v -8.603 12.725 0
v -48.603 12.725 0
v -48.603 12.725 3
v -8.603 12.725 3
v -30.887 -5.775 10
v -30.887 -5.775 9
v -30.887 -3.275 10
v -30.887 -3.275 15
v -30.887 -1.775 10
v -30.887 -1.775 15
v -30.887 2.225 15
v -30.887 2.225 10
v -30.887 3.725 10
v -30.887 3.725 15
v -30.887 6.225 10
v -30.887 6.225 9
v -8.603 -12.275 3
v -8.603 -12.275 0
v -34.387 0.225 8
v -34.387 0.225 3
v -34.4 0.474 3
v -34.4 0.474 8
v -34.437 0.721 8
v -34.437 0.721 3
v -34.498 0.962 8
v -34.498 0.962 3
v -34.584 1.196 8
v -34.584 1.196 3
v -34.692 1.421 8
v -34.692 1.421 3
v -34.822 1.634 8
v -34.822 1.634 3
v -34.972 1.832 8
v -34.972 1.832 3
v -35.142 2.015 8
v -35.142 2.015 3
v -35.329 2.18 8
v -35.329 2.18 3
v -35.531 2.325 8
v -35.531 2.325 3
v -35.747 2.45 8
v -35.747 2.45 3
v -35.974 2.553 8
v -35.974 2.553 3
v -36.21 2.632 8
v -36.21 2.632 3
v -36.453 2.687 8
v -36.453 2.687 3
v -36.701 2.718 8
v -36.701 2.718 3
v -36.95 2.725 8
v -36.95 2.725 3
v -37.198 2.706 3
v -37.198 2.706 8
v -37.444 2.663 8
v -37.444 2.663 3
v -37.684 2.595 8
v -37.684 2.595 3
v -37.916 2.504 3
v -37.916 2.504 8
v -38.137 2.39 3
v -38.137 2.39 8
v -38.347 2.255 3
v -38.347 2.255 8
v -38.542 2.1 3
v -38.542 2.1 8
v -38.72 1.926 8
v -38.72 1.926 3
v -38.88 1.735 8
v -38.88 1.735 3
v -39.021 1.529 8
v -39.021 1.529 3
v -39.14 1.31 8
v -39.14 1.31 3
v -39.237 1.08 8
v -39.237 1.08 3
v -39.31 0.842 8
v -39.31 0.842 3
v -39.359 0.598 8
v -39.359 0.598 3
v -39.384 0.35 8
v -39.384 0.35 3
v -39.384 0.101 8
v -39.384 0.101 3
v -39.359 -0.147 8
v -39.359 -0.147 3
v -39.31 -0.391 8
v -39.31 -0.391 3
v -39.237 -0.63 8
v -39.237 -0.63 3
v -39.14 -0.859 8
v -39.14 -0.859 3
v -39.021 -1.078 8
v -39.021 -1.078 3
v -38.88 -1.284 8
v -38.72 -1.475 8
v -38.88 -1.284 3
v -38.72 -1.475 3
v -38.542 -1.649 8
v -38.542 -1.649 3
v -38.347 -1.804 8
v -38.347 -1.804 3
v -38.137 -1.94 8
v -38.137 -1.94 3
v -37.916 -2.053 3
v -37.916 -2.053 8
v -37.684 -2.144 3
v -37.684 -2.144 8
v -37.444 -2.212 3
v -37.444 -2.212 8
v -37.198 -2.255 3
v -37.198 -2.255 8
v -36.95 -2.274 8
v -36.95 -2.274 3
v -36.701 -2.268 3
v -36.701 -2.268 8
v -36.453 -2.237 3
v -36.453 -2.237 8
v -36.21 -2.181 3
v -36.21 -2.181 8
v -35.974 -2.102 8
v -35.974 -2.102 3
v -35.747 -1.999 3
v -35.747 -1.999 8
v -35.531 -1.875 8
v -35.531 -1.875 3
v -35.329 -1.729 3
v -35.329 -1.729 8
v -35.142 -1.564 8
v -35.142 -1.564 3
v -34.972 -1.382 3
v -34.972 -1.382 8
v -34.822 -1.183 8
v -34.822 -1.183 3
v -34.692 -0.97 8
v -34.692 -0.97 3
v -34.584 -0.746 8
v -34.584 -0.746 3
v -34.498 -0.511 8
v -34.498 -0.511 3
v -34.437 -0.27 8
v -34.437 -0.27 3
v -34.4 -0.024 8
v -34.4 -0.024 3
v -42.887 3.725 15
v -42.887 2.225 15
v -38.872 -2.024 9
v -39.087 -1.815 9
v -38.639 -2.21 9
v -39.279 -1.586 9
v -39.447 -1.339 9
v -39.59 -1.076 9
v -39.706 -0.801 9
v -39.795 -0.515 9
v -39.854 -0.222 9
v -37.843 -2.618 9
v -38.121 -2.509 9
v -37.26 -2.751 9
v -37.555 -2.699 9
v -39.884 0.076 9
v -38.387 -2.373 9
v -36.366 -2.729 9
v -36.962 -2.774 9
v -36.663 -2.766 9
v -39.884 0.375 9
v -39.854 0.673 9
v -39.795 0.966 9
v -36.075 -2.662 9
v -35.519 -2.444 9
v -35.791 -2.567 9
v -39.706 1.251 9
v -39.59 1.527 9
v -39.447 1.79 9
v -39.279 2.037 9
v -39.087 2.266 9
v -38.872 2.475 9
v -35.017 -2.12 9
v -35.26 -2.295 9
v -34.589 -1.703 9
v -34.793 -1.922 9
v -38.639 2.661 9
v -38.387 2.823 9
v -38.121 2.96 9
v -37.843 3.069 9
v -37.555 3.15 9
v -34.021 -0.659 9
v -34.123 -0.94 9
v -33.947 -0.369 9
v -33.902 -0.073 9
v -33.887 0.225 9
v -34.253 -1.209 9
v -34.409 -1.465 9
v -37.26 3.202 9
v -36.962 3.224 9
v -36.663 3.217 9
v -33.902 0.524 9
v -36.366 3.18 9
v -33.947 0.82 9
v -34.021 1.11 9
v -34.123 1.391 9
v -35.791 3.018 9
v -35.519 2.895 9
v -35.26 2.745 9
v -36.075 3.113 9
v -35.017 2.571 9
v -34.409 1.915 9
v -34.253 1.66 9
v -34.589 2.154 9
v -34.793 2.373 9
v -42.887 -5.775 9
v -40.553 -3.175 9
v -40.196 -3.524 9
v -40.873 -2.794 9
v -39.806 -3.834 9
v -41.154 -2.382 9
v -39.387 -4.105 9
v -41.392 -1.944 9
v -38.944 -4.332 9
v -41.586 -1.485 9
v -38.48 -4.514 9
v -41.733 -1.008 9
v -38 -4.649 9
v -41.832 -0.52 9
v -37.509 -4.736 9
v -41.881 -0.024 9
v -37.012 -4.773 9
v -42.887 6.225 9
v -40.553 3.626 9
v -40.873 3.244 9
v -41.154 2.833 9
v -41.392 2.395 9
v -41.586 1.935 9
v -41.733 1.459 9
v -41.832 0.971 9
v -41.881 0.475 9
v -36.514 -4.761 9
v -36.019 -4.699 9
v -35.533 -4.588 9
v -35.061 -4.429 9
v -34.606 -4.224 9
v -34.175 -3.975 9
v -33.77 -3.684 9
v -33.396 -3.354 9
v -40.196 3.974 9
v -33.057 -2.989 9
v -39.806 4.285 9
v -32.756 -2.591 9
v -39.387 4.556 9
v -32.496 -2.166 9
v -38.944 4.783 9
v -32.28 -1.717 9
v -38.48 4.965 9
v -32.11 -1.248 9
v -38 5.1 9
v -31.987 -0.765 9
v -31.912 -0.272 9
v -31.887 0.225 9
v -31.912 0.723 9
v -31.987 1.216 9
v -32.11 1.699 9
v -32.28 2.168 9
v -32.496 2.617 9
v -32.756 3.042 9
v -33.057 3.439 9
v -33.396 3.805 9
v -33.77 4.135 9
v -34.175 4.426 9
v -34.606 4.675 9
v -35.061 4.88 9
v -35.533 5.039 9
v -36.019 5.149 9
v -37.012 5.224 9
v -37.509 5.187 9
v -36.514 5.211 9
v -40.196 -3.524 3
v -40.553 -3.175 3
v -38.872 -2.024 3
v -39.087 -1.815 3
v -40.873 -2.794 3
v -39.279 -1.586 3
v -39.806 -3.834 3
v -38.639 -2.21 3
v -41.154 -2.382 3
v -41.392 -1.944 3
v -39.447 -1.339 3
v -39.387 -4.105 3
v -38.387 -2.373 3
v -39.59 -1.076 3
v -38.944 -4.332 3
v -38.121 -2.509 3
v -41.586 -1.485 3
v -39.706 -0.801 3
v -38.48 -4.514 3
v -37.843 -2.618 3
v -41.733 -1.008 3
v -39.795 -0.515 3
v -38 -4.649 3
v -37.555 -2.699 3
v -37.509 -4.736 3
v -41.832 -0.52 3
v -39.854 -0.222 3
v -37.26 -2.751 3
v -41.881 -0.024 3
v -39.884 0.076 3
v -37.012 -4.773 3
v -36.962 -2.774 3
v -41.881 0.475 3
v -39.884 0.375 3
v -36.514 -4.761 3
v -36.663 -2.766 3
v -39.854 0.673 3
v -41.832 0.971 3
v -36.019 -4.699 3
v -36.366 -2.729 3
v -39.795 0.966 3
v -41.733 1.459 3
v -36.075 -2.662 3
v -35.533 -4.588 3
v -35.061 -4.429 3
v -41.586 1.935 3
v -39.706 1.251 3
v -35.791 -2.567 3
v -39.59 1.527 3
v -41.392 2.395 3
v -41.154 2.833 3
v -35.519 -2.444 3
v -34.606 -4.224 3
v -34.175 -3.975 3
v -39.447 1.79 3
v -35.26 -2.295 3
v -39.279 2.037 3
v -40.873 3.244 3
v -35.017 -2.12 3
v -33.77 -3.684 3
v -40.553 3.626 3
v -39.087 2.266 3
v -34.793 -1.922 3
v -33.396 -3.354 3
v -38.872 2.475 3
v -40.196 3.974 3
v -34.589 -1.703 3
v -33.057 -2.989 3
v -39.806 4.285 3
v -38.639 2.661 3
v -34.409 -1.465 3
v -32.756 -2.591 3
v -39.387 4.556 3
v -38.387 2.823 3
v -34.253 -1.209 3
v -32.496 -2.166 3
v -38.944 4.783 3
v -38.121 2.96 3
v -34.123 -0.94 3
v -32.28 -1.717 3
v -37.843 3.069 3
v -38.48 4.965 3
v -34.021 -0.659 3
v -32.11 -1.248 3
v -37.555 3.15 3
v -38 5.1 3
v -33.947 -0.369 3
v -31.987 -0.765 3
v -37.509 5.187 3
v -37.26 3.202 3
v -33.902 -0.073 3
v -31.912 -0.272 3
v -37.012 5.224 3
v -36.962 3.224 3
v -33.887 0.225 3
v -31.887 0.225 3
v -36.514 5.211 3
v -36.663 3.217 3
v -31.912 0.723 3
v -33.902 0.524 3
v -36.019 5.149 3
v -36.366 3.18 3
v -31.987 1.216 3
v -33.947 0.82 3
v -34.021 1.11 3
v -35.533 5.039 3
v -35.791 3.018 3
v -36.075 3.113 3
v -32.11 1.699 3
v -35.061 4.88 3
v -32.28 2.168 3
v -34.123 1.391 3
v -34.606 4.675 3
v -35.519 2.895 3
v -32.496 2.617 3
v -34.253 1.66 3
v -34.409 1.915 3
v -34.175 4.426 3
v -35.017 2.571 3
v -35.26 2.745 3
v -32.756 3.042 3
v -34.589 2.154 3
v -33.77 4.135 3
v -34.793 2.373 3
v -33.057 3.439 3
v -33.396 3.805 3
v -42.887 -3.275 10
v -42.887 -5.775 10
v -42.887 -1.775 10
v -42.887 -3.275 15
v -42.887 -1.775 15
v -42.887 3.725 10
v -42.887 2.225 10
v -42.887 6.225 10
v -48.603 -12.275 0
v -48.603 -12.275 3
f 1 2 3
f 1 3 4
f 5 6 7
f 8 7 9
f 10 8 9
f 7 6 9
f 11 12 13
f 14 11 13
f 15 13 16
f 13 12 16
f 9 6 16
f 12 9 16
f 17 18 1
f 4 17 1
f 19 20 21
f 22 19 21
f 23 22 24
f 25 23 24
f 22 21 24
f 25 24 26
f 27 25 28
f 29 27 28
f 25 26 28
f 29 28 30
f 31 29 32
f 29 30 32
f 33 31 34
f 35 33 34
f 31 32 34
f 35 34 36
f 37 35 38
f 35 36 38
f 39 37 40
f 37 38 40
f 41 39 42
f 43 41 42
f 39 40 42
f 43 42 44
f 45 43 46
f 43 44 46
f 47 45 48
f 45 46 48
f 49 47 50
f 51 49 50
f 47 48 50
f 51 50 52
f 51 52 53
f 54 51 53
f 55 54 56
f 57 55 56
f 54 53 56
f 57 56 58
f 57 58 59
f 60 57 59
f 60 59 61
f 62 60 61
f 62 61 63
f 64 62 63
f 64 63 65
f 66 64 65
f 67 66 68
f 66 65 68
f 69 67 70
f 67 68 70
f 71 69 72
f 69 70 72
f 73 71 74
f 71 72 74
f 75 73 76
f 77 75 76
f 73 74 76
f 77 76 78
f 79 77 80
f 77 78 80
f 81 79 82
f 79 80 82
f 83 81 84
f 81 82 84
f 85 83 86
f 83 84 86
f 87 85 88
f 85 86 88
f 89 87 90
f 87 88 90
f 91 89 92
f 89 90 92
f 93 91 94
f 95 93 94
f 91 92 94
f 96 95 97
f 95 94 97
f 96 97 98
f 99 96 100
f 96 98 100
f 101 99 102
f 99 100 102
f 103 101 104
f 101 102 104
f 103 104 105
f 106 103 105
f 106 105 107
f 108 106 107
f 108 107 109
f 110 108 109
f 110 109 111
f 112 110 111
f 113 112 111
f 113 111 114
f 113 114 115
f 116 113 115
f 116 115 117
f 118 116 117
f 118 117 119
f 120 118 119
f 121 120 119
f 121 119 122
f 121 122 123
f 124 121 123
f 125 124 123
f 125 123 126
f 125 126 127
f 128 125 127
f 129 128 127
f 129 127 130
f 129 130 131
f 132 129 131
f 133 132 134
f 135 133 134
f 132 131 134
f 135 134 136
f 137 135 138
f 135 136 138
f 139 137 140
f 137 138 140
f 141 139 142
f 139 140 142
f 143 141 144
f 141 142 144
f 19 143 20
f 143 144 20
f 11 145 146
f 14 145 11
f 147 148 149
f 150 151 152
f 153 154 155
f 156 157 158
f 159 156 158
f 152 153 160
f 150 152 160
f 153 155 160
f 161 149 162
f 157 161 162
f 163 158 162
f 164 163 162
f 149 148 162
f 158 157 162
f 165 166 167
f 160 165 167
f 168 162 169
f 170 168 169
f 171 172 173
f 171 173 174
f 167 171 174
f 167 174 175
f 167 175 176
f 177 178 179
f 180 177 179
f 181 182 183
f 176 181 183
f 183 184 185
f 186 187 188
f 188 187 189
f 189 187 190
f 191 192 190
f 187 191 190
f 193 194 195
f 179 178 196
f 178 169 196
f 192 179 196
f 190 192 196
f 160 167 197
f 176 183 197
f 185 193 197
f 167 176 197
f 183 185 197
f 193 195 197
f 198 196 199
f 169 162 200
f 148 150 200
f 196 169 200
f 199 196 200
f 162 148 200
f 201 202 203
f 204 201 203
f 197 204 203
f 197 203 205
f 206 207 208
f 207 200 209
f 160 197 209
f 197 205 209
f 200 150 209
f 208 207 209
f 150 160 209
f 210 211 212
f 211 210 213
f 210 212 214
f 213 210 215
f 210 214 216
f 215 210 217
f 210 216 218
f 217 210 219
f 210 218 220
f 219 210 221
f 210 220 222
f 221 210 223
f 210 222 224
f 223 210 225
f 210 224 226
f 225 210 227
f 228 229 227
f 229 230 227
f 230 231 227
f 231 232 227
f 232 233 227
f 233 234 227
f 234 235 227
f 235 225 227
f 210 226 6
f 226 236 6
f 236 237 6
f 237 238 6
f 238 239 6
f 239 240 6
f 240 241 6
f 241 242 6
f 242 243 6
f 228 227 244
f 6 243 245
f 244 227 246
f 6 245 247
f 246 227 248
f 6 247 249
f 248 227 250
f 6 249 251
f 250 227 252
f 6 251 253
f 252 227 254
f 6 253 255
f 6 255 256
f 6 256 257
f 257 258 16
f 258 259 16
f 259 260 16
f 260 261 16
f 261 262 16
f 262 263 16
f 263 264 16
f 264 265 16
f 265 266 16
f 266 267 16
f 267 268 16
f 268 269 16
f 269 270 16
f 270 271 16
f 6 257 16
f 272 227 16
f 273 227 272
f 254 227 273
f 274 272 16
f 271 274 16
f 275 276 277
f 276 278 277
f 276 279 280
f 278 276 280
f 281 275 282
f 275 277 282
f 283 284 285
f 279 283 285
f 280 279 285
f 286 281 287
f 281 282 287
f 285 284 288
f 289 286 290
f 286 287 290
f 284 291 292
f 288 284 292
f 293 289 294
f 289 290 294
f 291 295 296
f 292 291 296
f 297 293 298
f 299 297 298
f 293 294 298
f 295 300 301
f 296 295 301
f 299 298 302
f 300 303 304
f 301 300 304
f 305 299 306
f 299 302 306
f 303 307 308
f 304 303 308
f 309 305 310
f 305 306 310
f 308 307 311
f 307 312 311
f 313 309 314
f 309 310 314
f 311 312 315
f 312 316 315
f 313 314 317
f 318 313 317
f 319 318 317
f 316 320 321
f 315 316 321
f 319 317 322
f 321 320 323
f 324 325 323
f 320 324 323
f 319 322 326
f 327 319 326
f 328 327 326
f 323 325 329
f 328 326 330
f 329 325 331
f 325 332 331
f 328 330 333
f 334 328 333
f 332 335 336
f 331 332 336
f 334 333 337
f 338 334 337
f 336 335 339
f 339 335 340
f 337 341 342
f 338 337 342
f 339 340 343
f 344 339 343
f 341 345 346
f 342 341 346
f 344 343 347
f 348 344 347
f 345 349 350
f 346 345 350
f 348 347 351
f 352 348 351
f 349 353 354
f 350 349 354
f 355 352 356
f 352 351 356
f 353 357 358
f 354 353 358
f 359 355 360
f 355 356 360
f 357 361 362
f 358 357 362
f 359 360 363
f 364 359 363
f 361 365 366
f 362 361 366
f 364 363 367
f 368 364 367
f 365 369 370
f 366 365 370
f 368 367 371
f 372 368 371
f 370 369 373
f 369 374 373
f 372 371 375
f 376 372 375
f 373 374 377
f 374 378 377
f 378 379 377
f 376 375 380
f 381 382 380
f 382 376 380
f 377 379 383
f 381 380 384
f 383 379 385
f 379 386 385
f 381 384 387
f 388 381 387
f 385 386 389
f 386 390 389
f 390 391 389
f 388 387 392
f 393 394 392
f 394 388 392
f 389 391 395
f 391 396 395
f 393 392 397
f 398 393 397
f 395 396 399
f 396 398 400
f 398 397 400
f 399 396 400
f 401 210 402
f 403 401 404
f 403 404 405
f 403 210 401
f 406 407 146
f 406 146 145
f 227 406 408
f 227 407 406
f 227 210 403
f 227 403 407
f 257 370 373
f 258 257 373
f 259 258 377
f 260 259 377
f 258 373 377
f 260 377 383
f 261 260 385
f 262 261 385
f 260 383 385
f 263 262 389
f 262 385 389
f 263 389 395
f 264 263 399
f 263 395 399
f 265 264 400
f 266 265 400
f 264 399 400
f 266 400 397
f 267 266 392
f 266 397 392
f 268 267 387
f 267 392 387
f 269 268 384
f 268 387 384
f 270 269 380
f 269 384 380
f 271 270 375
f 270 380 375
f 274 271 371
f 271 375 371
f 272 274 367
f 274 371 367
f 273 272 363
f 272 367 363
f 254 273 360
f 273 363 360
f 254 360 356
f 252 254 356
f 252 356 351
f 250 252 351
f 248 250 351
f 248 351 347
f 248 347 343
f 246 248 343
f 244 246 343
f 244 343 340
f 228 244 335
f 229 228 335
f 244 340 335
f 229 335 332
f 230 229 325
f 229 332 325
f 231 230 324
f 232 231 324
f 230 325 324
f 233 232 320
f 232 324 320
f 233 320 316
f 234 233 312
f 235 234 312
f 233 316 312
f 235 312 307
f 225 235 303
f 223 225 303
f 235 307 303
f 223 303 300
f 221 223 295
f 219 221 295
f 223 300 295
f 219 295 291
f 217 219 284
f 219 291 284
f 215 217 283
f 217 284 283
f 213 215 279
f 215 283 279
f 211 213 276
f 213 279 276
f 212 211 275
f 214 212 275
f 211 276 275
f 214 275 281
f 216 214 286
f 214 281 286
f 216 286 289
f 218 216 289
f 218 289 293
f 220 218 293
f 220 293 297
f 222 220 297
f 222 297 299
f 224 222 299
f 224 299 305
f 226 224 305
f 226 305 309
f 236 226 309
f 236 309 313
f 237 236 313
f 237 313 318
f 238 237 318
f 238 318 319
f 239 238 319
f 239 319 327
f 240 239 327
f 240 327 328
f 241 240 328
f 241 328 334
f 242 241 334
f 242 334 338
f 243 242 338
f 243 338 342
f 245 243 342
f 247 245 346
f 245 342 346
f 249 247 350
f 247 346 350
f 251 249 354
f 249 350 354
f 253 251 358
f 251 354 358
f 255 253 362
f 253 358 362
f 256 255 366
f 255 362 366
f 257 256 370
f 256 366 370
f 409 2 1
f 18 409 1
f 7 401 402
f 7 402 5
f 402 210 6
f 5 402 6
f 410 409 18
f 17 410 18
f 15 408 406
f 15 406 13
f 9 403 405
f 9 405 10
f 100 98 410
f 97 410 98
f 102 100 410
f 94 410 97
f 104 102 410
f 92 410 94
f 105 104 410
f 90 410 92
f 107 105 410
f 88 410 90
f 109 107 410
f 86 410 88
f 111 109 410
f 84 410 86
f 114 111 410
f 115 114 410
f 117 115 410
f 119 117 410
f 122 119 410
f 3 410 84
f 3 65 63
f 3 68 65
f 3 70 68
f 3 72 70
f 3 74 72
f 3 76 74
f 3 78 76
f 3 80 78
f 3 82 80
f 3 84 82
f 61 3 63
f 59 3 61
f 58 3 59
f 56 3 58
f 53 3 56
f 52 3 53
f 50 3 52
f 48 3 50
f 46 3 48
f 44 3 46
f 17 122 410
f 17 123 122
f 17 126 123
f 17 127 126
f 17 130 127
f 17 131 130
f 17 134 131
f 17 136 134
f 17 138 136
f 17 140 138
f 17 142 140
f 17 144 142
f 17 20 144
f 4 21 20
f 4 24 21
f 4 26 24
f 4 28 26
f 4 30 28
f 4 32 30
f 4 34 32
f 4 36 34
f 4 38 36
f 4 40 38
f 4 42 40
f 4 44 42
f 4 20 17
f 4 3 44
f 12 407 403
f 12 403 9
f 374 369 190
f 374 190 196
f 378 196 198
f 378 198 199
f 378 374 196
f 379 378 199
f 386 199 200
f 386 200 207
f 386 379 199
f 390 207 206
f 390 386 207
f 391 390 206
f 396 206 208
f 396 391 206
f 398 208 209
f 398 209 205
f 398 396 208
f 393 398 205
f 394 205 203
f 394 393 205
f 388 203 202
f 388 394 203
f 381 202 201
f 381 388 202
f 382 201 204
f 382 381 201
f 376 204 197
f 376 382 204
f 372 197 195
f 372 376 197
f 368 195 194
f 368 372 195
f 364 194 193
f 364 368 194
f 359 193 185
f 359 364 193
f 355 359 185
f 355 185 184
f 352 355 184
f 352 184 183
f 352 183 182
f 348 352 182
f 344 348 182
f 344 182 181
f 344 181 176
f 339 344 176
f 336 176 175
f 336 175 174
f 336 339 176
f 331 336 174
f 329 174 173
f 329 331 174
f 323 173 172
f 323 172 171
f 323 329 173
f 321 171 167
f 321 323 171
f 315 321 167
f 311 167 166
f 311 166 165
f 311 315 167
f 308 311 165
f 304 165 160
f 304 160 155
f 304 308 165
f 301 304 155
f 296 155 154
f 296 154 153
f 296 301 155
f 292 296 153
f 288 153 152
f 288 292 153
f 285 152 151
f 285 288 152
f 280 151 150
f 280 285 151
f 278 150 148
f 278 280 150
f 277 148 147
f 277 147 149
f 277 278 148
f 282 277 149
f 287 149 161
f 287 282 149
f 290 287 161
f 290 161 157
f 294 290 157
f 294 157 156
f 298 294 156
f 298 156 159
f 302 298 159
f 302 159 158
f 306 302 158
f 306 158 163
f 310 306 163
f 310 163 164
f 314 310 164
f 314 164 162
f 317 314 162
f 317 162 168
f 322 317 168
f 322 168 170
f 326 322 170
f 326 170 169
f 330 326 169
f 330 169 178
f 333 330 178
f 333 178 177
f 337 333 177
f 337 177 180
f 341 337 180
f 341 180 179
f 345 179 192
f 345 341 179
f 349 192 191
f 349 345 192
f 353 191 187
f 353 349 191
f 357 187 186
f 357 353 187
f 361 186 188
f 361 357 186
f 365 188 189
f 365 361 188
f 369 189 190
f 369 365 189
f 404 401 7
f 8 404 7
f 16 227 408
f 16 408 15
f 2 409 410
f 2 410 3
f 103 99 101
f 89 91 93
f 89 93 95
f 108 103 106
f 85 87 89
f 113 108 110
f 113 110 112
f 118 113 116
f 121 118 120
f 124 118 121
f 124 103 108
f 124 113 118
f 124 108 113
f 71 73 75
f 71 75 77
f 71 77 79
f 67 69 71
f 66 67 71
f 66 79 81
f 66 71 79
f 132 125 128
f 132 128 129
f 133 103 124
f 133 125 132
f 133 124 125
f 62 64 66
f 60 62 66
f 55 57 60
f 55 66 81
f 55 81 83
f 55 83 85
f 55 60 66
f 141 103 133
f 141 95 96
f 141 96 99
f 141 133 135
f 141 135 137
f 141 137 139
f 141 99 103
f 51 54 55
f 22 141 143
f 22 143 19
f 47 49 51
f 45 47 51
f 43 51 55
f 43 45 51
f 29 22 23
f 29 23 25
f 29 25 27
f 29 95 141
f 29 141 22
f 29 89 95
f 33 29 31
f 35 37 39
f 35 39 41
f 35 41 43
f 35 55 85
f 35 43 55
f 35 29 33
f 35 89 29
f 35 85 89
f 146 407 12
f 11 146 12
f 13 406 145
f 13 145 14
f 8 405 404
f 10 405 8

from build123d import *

# Parameters (mm, degrees)
F0_W     = 40
F0_H     = 25
F1_DEPTH = 3
F2_R     = 2.5
F3_DEPTH = 5
F4_R     = 5
F4_R_2   = 3
F5_DEPTH = 6
F6_W     = 12
F6_H     = 12
F6_R     = 5
F6_R_2   = 3
F7_DEPTH = 1
F8_W     = 12
F8_H     = 1.5
F9_DEPTH = 5


with BuildPart() as f1:
    # F0 (on Top) → F1 (new body)
    with BuildSketch(Plane.XY):
        with Locations((-28.603337, 0.225398)):
            Rectangle(F0_W, F0_H)
    extrude(amount=F1_DEPTH)

    # F2 (on face) → F3 (join)
    with BuildSketch(Plane.XY.offset(3)):
        with Locations((-36.887389, 0.225398)):
            Circle(F2_R)
    extrude(amount=F3_DEPTH)


with BuildPart() as f5:
    # F4 (on face) → F5 (new body)
    with BuildSketch(Plane.XY.offset(3)):
        with Locations((-36.887389, 0.225398)):
            Circle(F4_R)
        with Locations((-36.887389, 0.225398)):
            Circle(F4_R_2, mode=Mode.SUBTRACT)
    extrude(amount=F5_DEPTH)

    # F6 (on face) → F7 (join)
    with BuildSketch(Plane.XY.offset(9)):
        with Locations((-36.887389, 0.225398)):
            Rectangle(F6_W, F6_H)
        with Locations((-36.887389, 0.225398)):
            Circle(F6_R, mode=Mode.SUBTRACT)
        with Locations((-36.887389, 0.225398)):
            Circle(F6_R)
        with Locations((-36.887389, 0.225398)):
            Circle(F6_R_2, mode=Mode.SUBTRACT)
        with Locations((-36.887389, 0.225398)):
            Circle(F6_R_2)
    extrude(amount=F7_DEPTH)

    # F8 (on face) → F9 (join)
    with BuildSketch(Plane.XY.offset(10)):
        with Locations((-36.887389, 2.975398)):
            Rectangle(F8_W, F8_H)
        with Locations((-36.887389, -2.524602)):
            Rectangle(F8_W, F8_H)
    extrude(amount=F9_DEPTH)


solid = Compound([f1.part, f5.part])
